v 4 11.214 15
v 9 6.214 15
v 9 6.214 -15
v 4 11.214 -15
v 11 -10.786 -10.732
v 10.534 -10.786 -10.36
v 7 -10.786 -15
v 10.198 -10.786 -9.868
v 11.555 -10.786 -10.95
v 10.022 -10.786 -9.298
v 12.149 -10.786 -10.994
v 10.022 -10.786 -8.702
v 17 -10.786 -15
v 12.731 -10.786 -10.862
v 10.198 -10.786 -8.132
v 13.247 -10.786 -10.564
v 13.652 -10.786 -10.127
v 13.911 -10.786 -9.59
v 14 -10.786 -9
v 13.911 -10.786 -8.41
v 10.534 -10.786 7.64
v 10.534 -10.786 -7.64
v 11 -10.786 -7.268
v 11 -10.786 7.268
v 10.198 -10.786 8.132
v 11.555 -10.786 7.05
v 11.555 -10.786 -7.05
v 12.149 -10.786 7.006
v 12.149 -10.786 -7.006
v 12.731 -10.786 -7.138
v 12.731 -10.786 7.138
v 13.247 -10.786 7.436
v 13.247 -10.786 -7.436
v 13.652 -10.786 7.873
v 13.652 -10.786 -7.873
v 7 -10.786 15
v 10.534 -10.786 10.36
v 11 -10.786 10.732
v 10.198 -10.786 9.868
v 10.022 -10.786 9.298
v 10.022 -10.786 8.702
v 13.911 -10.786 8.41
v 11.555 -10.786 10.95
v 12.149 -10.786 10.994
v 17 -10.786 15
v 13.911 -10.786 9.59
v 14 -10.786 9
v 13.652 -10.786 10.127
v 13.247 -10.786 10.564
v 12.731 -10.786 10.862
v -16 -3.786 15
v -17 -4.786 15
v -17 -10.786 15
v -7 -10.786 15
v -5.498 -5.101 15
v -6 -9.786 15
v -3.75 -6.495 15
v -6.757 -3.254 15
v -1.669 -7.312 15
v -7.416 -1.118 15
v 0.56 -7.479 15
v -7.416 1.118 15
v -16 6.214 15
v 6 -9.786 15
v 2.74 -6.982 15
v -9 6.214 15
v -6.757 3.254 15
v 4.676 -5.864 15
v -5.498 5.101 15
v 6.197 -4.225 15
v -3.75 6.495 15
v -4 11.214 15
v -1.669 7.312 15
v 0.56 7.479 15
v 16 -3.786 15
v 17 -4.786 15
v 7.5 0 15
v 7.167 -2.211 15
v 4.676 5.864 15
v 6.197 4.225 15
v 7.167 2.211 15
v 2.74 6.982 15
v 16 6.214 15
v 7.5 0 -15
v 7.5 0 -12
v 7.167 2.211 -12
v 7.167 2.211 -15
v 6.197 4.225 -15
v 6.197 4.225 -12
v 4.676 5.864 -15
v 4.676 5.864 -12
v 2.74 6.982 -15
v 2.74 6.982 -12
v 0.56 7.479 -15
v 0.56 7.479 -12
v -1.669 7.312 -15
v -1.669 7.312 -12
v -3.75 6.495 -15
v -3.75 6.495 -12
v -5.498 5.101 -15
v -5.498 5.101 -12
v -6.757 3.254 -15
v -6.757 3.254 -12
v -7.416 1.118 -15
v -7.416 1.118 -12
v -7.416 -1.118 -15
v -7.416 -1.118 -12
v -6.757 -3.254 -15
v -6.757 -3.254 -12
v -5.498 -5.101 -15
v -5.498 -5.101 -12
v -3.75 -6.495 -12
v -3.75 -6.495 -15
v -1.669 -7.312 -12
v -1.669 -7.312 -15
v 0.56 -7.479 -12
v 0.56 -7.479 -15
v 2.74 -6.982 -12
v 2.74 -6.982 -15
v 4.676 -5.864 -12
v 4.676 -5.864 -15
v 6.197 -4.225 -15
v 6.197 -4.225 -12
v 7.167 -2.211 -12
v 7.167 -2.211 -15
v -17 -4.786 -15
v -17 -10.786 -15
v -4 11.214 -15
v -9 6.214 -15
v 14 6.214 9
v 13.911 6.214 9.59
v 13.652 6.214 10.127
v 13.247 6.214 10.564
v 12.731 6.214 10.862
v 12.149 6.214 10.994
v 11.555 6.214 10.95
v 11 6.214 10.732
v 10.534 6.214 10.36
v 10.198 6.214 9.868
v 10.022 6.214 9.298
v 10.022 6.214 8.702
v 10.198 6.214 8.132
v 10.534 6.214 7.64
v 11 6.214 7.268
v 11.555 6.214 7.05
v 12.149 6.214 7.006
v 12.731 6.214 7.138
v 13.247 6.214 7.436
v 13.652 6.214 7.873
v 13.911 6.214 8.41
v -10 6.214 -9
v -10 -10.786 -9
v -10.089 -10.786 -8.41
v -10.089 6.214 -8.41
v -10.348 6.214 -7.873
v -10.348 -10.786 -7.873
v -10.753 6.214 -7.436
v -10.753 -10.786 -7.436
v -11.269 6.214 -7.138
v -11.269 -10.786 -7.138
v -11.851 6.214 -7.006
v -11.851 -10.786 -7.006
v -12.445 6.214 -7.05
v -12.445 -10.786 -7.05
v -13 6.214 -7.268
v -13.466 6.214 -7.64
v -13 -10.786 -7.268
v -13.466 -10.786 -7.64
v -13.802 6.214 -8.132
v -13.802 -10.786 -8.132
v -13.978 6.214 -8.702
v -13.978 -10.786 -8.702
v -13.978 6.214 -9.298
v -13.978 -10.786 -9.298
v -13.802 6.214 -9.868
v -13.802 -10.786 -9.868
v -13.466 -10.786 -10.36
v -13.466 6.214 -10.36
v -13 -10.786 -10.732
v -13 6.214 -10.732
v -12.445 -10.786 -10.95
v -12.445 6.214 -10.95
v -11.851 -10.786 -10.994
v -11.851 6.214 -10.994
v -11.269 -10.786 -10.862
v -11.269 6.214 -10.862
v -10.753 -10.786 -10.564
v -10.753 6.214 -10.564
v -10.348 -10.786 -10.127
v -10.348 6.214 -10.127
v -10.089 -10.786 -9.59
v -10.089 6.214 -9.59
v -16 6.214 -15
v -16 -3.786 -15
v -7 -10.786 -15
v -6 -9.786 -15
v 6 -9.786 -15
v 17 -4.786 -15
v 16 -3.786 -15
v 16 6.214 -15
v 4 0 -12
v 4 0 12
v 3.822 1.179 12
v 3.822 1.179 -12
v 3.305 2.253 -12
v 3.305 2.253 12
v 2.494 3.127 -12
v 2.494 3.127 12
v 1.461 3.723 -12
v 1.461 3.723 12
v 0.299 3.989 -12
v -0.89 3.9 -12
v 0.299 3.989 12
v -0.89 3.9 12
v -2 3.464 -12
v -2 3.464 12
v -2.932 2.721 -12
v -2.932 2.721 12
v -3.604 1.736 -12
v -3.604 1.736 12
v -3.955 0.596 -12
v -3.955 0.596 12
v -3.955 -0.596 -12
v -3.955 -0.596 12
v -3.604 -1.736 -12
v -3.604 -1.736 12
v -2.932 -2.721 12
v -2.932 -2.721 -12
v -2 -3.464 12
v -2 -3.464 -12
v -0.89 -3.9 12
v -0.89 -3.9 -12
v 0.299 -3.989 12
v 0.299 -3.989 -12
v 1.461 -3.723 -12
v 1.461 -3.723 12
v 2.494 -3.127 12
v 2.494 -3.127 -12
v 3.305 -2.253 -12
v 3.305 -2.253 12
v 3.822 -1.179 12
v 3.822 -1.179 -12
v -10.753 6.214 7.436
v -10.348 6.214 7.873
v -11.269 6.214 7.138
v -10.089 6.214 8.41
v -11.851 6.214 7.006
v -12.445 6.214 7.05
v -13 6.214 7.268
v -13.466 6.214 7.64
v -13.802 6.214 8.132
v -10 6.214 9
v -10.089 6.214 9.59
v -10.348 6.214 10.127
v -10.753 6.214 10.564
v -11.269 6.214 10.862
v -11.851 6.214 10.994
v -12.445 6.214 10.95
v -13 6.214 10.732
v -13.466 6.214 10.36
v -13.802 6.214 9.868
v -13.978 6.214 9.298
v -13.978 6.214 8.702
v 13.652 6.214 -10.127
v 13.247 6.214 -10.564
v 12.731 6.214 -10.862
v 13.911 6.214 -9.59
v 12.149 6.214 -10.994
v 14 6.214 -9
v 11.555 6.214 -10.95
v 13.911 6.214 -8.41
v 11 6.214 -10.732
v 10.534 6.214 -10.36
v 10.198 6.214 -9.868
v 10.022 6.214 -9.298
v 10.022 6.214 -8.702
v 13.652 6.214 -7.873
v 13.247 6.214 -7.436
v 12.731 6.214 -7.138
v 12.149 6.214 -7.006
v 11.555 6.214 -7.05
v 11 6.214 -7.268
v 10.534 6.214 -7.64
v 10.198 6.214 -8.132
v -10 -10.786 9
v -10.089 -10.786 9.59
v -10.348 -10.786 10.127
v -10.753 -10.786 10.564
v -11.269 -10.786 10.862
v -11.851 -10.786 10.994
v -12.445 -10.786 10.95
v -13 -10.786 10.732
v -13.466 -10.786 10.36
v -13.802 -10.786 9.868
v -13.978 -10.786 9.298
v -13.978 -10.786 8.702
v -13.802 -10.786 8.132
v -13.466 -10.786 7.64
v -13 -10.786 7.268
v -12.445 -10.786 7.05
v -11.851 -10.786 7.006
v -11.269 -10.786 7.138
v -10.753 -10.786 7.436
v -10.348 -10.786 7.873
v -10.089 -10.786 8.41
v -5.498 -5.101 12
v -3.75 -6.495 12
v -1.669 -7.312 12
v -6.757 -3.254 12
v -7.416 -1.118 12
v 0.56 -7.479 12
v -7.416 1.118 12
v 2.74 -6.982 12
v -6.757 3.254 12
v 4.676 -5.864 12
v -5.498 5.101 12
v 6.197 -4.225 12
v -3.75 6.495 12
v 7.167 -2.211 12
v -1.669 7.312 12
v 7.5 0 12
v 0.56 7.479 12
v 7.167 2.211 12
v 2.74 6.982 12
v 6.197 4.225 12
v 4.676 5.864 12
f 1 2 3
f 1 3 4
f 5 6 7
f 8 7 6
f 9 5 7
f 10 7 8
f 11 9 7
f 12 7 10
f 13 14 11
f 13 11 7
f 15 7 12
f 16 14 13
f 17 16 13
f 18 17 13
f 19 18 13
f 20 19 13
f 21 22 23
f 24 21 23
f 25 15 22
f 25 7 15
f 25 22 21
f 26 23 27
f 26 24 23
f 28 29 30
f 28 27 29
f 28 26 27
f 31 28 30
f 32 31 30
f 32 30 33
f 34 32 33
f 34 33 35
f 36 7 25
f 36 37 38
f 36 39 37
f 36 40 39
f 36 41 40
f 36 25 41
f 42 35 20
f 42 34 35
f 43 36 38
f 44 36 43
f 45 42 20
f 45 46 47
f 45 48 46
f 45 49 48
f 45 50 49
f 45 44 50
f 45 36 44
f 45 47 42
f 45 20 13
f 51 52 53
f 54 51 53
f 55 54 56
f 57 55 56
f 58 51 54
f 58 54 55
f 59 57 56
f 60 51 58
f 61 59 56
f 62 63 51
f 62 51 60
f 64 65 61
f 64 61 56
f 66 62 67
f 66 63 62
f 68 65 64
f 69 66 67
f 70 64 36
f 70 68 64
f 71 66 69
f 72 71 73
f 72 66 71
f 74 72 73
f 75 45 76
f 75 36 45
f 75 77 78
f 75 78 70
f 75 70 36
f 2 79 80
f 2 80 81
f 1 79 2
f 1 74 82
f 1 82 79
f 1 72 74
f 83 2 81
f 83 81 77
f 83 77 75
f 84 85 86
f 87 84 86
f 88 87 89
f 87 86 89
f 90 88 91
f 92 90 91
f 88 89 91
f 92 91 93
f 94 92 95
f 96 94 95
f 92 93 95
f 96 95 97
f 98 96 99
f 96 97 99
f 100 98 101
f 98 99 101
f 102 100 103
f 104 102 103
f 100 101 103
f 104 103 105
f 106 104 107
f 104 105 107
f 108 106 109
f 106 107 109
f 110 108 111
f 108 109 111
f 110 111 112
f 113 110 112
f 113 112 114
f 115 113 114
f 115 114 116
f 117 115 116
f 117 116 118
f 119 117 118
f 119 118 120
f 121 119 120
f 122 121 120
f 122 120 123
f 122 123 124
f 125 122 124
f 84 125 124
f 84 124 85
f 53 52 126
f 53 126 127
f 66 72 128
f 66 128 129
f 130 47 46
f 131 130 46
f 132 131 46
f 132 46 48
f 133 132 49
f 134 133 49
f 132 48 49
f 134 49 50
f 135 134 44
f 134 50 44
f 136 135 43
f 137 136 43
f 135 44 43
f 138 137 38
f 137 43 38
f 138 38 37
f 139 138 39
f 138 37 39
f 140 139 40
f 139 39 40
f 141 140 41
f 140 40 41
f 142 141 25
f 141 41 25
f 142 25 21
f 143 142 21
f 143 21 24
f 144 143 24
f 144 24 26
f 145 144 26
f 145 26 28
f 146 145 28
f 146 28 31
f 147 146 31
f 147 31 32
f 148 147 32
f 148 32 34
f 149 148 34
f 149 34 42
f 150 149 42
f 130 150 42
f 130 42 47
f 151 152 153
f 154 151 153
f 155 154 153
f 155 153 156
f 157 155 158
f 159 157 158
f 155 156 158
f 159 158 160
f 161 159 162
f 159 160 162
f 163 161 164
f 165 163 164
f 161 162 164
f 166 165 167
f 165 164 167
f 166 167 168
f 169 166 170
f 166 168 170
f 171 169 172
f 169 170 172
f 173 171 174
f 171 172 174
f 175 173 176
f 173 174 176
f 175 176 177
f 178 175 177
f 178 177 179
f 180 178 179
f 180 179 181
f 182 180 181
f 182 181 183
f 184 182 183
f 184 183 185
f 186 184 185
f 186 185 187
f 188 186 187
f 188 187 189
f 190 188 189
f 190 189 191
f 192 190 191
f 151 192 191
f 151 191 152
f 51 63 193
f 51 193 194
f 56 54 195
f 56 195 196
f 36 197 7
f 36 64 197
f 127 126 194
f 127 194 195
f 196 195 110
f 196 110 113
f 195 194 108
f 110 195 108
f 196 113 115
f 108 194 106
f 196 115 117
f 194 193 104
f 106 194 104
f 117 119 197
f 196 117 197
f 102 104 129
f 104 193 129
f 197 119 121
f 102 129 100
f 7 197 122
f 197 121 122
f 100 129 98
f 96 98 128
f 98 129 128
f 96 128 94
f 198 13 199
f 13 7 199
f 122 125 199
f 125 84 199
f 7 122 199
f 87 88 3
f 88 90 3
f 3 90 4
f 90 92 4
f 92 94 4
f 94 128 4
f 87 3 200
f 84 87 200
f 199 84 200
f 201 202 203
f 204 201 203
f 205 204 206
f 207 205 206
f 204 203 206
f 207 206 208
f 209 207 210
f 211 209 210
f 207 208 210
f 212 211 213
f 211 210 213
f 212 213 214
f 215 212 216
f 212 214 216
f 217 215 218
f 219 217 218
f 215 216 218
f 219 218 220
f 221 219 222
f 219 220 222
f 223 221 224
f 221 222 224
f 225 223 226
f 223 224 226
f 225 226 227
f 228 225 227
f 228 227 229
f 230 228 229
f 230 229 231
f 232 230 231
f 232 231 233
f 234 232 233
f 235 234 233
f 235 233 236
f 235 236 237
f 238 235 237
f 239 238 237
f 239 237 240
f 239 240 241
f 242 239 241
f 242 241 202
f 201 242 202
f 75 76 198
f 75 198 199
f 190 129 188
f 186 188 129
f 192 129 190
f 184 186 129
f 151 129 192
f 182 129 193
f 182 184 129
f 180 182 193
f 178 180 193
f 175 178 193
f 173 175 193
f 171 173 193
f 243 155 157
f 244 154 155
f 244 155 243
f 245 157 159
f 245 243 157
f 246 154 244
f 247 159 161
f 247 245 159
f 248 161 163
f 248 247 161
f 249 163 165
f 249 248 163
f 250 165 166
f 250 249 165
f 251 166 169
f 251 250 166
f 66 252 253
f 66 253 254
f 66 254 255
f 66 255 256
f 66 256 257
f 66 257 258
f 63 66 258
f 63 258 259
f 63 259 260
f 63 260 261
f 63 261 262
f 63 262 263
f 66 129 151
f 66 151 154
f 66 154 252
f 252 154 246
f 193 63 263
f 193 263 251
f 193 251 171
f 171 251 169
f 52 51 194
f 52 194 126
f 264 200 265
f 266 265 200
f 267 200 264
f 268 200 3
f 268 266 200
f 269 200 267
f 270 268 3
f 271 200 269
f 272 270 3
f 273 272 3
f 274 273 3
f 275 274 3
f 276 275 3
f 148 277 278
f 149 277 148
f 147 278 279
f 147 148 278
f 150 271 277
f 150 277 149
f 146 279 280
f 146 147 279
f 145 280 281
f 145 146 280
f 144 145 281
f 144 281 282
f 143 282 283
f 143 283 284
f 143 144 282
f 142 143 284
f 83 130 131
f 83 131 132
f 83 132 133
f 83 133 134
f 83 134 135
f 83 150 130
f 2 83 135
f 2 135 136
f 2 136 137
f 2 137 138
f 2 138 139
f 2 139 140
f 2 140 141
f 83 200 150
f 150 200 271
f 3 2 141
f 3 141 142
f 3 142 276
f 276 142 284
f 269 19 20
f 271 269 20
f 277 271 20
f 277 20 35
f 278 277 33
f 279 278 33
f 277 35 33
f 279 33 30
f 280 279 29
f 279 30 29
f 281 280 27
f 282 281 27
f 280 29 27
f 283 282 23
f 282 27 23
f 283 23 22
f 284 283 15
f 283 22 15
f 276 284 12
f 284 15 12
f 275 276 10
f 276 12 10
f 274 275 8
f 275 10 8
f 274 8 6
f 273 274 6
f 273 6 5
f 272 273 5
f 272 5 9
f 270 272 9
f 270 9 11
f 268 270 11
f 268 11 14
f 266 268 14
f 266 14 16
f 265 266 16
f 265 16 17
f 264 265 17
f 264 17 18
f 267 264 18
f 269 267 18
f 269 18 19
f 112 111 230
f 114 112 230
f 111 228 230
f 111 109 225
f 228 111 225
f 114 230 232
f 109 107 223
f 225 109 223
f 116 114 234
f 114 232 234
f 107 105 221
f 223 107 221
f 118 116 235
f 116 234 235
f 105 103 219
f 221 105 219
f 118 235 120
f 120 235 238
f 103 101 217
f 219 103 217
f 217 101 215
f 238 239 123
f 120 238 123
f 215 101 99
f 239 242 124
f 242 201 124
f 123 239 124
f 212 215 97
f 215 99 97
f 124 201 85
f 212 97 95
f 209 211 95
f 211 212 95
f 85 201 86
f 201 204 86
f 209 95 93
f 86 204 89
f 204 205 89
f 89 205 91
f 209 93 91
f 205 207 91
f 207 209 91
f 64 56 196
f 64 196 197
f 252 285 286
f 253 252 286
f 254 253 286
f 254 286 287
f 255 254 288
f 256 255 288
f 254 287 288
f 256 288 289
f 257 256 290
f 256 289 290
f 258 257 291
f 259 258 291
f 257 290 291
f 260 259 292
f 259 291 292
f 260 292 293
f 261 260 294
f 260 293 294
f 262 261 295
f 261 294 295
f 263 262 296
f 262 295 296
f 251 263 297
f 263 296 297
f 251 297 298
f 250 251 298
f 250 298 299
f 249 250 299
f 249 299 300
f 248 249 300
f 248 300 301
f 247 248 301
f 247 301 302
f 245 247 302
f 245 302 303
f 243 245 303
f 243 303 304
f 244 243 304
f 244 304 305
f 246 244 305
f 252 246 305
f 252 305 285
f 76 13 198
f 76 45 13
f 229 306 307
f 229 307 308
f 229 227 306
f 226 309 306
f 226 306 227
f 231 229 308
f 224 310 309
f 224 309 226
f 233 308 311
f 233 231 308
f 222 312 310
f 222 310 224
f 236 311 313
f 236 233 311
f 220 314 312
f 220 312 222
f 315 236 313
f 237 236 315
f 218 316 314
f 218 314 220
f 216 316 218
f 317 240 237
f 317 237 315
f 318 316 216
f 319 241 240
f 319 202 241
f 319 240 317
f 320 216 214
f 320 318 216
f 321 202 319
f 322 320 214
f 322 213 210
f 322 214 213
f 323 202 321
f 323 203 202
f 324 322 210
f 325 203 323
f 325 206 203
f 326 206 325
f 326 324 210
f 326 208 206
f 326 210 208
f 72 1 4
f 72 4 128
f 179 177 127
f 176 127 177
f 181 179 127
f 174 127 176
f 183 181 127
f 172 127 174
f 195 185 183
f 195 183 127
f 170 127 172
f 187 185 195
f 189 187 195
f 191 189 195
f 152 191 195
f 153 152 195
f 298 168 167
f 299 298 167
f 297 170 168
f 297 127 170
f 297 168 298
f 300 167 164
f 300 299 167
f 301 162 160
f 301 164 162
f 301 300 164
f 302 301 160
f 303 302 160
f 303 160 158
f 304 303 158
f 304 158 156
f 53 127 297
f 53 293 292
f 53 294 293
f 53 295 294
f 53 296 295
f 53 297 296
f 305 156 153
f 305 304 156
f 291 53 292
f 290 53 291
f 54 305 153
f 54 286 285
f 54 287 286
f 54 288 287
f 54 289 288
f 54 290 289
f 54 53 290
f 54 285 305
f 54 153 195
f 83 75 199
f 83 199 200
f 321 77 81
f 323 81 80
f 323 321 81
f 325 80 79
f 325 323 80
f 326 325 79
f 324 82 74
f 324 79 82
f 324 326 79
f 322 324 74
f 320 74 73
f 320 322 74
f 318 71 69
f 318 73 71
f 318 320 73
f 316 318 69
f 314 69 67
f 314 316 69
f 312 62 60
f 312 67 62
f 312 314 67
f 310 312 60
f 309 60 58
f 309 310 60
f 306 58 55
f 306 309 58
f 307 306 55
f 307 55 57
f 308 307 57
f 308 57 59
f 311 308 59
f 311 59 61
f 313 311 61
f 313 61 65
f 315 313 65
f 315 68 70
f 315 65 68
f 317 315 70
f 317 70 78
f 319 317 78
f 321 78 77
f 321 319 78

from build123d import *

# Parameters (mm, degrees)
BOSS_EXTRUDE1_DEPTH      = 15
BOSS_EXTRUDE1_DEPTH_BACK = 15
CUT_EXTRUDE1_START       = -12
SKETCH2_R                = 7.5
CUT_EXTRUDE1_DEPTH       = 14.293178723
SKETCH3_R                = 4
CUT_EXTRUDE2_DEPTH       = 34.819297596
SKETCH4_R                = 2
CUT_EXTRUDE3_DEPTH       = 32.591137998


with BuildPart() as part:
    # Sketch1 → Boss-Extrude1 (new, two sides: drawn at the far end of the back side and taken through both)
    with BuildSketch(Plane.XY.offset(-BOSS_EXTRUDE1_DEPTH_BACK)):
        Polygon((7, -10.786397104), (17, -10.786397104), (17, -4.786397104), (16, -3.786397104), (16, 6.213602896), (9, 6.213602896), (4, 11.213602896), (-4, 11.213602896), (-9, 6.213602896), (-16, 6.213602896), (-16, -3.786397104), (-17, -4.786397104), (-17, -10.786397104), (-7, -10.786397104), (-6, -9.786397104), (6, -9.786397104), align=None)
    extrude(amount=BOSS_EXTRUDE1_DEPTH + BOSS_EXTRUDE1_DEPTH_BACK)

    # Sketch2 → Cut-Extrude1 (cut, through all)
    with BuildSketch(Plane.XY.offset(CUT_EXTRUDE1_START)):
        Circle(SKETCH2_R)
    cut_extrude1 = extrude(amount=-CUT_EXTRUDE1_DEPTH, mode=Mode.SUBTRACT)

    # Mirror1: Cut-Extrude1 across plane
    add(cut_extrude1.mirror(Plane.XY), mode=Mode.SUBTRACT)

    # Sketch3 → Cut-Extrude2 (cut, through all)
    with BuildSketch(Plane.XY.offset(12)):
        Circle(SKETCH3_R)
    extrude(amount=-CUT_EXTRUDE2_DEPTH, mode=Mode.SUBTRACT)

    # Sketch4 → Cut-Extrude3 (cut, through all)
    with BuildSketch(Plane.XZ.offset(10.786397104)):
        with Locations((12, 9)):
            Circle(SKETCH4_R)
        with Locations((-12, 9)):
            Circle(SKETCH4_R)
        with Locations((12, -9)):
            Circle(SKETCH4_R)
        with Locations((-12, -9)):
            Circle(SKETCH4_R)
    extrude(amount=-CUT_EXTRUDE3_DEPTH, mode=Mode.SUBTRACT)


solid = part.part
